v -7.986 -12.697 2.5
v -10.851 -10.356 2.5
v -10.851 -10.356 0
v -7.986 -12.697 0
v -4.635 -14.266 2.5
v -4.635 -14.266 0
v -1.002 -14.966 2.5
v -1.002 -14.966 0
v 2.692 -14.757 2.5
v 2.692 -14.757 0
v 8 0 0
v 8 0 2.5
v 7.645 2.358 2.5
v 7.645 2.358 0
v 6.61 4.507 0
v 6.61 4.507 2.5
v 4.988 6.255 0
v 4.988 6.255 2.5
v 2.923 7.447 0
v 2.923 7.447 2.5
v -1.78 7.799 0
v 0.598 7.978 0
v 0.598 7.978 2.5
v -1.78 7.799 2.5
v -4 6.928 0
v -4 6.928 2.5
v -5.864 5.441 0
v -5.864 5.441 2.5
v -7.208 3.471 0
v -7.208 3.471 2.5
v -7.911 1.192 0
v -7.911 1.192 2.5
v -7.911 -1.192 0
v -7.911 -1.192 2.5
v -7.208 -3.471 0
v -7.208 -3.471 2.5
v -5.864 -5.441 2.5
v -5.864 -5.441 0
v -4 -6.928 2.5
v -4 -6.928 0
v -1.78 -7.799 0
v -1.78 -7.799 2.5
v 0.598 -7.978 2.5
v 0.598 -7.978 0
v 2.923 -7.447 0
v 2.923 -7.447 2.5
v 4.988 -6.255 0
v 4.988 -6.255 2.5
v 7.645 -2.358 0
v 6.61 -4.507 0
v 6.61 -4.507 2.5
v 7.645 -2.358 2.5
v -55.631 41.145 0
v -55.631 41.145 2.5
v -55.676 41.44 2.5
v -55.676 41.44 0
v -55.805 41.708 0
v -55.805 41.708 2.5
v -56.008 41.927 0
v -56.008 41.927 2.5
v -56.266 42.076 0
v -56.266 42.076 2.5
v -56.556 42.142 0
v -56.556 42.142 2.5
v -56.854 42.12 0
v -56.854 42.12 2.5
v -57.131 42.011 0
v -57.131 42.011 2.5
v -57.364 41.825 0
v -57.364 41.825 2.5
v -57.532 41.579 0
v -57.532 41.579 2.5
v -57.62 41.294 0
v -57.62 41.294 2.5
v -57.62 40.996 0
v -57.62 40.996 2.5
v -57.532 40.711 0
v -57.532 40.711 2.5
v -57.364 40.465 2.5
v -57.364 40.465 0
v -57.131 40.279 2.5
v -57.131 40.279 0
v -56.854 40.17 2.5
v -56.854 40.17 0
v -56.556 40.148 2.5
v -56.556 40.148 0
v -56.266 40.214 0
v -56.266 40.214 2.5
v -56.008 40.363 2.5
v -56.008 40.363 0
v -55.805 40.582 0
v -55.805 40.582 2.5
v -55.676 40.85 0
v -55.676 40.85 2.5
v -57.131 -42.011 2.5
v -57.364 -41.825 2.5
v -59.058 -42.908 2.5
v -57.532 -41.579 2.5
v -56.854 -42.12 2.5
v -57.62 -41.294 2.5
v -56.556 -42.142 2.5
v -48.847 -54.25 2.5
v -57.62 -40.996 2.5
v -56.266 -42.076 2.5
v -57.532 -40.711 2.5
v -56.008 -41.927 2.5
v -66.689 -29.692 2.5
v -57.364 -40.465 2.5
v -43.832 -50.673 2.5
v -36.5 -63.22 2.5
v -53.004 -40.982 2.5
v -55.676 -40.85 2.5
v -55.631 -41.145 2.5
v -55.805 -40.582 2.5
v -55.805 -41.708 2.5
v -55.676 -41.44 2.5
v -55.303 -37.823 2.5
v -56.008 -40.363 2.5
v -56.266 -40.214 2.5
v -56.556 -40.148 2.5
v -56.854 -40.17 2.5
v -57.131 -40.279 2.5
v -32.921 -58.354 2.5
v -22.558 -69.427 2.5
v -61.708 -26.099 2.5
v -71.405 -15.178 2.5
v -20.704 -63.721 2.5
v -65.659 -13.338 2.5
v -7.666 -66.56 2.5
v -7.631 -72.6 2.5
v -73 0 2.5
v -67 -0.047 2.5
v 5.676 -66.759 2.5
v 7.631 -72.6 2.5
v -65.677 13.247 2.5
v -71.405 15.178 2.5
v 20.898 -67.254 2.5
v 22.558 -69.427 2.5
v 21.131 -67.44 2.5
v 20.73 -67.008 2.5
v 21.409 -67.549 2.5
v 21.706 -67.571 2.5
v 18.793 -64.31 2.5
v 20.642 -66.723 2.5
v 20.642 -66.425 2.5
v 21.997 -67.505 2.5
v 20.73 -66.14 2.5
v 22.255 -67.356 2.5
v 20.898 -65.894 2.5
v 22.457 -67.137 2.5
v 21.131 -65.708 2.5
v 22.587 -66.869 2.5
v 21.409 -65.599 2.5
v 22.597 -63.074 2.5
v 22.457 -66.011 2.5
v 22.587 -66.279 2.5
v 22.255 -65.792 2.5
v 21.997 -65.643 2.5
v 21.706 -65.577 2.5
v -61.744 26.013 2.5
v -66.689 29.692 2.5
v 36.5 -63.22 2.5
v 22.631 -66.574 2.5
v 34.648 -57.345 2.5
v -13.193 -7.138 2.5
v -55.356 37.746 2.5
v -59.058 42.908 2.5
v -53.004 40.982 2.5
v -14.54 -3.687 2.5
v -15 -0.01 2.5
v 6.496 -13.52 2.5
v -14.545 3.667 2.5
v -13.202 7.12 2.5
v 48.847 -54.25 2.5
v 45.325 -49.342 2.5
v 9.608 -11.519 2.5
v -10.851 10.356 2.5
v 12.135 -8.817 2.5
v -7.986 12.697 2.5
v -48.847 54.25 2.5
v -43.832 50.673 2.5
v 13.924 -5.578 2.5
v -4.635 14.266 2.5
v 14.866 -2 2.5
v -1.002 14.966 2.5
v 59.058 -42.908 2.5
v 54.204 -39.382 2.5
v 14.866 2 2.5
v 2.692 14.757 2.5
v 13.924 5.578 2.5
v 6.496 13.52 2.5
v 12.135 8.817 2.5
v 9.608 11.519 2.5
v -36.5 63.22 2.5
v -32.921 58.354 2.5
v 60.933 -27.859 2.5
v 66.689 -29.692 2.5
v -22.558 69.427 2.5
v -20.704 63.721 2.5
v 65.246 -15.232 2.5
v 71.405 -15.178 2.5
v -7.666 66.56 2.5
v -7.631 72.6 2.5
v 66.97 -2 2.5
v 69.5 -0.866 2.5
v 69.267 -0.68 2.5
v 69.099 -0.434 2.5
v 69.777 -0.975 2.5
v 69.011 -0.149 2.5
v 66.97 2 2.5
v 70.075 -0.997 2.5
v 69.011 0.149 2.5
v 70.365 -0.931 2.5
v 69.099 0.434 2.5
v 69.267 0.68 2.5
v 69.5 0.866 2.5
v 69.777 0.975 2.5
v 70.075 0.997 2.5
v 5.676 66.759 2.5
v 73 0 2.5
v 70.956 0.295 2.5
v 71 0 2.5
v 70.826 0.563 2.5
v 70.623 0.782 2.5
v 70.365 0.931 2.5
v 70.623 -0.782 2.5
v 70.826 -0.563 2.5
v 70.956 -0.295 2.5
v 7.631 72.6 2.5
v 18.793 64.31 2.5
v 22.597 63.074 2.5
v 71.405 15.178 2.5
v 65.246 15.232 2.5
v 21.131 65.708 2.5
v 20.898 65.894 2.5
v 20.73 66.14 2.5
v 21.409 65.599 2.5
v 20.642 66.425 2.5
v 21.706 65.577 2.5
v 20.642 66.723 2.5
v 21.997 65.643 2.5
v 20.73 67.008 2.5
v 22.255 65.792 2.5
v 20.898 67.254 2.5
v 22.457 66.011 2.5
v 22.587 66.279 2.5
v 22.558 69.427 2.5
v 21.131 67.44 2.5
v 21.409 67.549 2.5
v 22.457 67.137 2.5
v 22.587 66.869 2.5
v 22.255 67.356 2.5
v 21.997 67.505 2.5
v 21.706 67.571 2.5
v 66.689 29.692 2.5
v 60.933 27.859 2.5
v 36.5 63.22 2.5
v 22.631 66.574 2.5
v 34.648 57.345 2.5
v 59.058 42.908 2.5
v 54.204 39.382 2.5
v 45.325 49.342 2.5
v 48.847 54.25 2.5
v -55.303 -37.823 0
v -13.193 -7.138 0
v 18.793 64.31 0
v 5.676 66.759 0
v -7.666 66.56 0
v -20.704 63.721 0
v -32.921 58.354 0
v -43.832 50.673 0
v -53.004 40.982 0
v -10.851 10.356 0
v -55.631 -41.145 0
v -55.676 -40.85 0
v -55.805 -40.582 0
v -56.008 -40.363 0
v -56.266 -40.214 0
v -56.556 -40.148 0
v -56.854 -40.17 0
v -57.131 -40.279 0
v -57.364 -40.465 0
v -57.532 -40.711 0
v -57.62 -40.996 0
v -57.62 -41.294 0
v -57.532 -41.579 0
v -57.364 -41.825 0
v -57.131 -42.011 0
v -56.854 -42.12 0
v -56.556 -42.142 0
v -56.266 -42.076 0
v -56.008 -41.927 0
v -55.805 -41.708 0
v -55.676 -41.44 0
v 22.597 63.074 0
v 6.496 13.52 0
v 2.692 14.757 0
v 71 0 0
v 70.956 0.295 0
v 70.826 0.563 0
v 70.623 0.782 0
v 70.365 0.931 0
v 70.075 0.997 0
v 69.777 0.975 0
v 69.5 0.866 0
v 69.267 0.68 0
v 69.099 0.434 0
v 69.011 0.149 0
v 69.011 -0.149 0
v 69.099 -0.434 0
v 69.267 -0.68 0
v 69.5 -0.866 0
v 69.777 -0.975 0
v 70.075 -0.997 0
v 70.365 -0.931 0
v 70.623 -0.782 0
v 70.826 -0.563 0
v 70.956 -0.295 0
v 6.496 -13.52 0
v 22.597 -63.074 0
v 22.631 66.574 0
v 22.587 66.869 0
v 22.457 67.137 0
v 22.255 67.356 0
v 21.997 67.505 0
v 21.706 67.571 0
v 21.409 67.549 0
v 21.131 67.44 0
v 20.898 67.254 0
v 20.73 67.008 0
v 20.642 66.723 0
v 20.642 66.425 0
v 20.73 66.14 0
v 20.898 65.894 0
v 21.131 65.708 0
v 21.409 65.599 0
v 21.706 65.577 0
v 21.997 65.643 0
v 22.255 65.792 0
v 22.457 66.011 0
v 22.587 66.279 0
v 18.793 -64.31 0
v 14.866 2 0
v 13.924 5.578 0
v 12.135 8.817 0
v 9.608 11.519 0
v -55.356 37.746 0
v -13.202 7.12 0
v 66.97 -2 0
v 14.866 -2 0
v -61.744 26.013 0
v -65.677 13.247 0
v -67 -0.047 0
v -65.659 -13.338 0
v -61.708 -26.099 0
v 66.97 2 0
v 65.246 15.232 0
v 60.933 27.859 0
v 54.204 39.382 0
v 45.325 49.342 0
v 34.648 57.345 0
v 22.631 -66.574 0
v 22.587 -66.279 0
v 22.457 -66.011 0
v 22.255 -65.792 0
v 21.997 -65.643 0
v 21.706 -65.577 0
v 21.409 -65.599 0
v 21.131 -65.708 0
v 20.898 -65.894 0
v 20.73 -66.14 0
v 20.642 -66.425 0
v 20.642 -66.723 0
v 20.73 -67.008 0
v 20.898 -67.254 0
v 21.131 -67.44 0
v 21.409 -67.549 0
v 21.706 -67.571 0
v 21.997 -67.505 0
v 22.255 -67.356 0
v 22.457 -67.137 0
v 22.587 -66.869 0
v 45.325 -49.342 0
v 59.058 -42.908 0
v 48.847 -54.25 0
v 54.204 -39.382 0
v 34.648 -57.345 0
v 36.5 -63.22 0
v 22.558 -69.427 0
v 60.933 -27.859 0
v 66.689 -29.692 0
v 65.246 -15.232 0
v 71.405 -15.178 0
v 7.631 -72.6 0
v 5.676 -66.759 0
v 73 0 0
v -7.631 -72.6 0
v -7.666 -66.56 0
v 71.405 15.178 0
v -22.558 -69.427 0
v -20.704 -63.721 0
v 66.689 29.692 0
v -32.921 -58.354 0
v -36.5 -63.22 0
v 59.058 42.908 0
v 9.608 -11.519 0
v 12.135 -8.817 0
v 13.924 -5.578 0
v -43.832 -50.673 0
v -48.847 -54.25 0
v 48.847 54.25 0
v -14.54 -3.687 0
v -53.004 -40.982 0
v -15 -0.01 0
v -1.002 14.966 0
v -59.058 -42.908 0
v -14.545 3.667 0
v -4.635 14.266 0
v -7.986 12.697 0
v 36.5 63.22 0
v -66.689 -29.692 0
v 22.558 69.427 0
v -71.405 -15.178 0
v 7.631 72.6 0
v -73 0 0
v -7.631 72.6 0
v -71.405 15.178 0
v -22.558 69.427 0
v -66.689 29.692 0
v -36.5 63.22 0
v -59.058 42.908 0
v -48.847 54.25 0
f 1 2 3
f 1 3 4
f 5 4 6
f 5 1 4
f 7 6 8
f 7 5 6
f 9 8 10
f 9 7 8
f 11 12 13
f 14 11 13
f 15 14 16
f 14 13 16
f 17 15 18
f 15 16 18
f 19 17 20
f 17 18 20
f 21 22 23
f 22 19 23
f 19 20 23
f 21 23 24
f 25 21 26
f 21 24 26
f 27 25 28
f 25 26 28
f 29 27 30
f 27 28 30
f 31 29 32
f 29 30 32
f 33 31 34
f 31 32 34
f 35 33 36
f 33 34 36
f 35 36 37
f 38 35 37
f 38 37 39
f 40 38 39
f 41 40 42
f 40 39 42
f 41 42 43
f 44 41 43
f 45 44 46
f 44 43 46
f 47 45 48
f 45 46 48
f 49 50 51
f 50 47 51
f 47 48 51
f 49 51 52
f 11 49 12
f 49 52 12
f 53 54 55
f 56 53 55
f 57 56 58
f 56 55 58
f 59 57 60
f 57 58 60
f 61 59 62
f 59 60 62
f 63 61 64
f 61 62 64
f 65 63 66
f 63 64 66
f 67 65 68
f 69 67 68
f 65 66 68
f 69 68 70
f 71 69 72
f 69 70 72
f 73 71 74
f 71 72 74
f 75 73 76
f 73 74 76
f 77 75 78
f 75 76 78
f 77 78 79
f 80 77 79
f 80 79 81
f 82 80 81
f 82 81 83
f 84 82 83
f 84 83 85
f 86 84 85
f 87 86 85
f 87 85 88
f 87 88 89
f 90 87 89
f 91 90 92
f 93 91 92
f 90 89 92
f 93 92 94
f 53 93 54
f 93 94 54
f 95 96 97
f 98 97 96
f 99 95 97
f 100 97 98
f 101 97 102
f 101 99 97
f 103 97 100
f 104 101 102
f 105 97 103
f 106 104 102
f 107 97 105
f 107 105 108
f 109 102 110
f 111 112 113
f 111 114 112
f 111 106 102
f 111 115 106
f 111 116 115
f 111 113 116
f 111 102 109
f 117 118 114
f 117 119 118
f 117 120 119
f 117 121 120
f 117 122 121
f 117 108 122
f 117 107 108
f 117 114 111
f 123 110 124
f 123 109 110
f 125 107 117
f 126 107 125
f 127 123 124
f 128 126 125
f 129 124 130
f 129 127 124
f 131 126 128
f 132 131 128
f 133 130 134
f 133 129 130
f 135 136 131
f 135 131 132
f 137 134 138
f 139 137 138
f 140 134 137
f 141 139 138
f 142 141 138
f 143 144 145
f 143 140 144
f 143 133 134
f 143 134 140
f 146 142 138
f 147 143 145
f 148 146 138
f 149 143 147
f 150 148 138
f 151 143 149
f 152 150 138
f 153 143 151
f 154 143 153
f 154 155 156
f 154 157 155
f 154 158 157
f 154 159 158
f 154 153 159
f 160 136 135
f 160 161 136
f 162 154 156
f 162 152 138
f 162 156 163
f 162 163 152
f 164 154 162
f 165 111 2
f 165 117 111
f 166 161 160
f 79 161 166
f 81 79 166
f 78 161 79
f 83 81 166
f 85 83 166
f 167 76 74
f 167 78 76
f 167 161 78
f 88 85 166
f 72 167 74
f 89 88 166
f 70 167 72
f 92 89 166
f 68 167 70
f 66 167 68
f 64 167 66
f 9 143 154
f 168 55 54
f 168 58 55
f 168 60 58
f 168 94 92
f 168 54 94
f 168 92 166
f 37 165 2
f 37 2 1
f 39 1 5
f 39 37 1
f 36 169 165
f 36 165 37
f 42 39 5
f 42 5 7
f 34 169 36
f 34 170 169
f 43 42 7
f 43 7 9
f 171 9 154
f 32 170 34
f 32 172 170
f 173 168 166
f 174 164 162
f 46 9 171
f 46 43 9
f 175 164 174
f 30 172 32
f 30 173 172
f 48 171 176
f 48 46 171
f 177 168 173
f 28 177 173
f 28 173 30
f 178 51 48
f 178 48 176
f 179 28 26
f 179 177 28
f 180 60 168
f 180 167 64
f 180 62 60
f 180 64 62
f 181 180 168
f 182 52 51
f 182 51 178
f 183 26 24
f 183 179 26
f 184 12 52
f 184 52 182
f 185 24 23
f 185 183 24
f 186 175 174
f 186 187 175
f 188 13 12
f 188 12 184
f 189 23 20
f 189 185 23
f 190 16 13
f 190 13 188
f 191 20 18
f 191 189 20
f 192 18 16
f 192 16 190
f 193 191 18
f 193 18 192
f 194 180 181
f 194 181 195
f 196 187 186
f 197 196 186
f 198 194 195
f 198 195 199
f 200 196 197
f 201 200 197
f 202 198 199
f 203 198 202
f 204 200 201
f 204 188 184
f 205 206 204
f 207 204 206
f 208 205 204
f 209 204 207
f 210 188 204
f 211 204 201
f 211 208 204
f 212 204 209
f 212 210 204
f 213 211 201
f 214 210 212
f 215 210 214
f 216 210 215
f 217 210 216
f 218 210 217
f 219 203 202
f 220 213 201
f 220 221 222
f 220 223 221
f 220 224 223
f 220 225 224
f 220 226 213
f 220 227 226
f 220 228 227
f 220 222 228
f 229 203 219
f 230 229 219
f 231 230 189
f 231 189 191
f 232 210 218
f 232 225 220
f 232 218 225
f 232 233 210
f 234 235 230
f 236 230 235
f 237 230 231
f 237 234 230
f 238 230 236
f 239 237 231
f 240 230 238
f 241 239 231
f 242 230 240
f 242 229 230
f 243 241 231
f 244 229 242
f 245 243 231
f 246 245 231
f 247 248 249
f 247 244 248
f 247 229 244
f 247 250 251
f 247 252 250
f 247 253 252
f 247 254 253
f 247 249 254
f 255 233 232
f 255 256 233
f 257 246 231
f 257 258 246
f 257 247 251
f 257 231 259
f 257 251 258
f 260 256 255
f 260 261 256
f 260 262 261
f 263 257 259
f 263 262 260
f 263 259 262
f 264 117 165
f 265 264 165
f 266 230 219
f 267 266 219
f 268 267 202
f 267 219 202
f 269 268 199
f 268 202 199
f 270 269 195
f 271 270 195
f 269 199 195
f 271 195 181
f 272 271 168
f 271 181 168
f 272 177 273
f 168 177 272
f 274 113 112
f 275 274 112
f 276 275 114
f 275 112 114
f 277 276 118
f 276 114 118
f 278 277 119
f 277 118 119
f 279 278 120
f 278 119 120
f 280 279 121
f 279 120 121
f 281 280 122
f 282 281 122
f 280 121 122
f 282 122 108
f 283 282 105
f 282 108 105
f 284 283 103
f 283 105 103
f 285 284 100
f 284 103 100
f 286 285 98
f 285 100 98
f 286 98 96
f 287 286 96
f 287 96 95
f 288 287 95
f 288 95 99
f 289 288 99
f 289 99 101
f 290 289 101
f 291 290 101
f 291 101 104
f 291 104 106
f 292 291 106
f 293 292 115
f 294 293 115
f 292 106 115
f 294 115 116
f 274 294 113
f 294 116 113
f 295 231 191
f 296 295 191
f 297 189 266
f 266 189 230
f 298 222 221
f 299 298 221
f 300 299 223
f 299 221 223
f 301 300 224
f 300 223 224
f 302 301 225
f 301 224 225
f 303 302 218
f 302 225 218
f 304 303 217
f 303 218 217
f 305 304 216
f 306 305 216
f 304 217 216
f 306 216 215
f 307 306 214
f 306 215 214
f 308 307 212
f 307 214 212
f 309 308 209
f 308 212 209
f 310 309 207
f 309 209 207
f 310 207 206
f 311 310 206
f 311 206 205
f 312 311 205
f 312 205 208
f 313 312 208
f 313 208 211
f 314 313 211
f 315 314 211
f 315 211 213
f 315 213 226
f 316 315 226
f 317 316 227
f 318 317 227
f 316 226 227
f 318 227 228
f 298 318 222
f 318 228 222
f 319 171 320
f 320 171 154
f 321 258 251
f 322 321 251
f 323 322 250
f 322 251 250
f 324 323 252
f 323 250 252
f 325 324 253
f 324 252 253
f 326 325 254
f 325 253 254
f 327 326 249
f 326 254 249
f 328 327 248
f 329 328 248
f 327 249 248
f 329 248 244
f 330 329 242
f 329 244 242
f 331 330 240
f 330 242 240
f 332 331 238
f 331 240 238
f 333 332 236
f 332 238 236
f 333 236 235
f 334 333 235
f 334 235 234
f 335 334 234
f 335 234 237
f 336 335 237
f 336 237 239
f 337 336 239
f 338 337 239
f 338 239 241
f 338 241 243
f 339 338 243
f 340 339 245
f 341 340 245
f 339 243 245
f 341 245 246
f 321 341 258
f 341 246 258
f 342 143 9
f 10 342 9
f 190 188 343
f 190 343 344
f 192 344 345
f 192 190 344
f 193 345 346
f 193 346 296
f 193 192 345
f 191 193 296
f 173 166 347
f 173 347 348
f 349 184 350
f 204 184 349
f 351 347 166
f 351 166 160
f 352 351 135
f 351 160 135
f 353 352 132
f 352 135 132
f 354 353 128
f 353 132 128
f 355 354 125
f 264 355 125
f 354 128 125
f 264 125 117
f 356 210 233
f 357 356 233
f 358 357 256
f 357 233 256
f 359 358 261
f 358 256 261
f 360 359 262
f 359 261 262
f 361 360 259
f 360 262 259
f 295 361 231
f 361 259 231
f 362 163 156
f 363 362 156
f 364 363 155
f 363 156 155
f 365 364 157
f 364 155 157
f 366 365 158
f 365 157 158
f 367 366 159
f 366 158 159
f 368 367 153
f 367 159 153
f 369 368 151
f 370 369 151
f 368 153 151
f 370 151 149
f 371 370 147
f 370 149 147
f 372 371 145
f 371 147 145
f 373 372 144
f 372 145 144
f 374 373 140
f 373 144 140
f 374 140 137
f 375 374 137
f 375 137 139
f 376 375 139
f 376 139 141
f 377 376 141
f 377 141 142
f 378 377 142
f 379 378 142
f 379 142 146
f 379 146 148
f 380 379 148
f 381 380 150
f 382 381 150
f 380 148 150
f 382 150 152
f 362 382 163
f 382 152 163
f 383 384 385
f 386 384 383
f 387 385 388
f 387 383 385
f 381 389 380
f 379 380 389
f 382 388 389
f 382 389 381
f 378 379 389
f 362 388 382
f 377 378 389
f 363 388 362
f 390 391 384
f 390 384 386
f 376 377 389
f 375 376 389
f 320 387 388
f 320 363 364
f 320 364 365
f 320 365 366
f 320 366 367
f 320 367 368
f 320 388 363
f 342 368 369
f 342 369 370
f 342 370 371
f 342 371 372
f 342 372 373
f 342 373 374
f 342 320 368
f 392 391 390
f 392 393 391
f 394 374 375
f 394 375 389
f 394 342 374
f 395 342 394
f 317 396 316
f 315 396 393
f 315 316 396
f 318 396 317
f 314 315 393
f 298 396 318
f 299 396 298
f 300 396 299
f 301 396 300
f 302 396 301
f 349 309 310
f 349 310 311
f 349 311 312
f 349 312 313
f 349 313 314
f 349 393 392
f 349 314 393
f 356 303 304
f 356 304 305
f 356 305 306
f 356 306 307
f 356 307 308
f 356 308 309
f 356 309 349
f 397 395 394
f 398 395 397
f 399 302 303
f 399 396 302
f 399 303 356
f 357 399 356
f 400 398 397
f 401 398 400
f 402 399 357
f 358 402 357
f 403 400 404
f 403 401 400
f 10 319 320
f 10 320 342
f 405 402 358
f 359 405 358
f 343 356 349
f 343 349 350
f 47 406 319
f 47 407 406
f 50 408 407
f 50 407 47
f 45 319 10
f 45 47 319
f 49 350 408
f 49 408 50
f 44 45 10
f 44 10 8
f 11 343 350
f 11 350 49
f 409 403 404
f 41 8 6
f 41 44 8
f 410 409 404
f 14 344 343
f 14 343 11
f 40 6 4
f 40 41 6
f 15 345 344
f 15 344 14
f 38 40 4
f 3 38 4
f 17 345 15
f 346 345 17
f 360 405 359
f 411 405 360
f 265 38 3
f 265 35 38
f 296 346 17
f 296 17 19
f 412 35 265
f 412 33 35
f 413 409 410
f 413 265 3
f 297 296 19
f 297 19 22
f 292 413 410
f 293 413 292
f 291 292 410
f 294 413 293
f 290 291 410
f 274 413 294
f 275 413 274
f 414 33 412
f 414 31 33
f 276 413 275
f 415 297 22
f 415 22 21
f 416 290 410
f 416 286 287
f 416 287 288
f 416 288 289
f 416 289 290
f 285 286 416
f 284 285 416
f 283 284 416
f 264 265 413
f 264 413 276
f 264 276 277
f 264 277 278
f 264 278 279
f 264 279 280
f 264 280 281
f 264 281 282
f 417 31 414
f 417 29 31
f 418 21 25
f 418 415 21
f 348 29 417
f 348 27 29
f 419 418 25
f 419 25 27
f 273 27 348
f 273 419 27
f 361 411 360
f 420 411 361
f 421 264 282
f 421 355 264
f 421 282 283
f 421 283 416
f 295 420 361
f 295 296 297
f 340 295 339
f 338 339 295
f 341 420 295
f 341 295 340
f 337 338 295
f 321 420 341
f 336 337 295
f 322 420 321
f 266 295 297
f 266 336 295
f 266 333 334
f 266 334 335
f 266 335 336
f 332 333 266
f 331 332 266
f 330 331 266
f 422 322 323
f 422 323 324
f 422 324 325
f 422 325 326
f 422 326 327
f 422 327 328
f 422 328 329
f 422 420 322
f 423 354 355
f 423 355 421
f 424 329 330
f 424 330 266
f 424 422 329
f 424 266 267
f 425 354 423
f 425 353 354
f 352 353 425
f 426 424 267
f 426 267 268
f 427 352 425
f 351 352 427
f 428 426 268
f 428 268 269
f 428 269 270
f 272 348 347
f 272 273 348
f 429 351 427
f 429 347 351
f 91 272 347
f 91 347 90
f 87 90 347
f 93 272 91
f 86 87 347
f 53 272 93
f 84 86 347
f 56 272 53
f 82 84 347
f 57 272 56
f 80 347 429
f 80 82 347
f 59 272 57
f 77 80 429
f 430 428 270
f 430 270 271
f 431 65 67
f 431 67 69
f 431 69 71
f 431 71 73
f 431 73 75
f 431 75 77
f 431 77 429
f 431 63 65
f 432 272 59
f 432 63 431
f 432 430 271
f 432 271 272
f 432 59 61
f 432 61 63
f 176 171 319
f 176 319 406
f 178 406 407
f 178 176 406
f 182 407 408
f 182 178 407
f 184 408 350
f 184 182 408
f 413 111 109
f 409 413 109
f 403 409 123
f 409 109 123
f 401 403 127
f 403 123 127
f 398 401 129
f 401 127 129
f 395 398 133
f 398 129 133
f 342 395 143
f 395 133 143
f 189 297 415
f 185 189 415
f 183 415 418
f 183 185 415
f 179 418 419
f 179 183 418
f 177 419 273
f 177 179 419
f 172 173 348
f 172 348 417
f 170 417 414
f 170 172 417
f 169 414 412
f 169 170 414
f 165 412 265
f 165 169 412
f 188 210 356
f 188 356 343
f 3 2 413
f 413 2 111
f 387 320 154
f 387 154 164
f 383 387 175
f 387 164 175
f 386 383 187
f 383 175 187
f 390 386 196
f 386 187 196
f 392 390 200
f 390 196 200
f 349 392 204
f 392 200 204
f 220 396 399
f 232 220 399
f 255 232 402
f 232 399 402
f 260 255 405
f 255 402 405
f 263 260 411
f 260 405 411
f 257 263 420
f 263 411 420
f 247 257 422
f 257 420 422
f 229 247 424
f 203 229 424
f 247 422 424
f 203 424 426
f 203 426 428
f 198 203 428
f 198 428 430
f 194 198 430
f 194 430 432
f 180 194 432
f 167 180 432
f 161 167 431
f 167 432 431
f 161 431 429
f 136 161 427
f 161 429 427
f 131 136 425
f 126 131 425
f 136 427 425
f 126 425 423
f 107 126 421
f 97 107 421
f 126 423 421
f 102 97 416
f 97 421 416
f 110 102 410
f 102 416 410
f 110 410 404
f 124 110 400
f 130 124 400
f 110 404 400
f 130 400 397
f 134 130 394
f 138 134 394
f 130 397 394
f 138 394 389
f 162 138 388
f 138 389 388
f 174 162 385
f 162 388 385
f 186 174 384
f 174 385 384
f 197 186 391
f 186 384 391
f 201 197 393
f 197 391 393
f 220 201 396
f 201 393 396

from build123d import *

# Parameters (mm, degrees)
SKETCH_3_R          = 73
EXTRUDE_3_DEPTH     = 2.5
SKETCH_5_R          = 67
CUT_EXTRUDE_1_DEPTH = 2.5
SKETCH_6_R          = 15
EXTRUDE_4_DEPTH     = 2.5
SKETCH_7_R          = 8
CUT_EXTRUDE_2_DEPTH = 2.5
EXTRUDE_6_DEPTH     = 2.5
EXTRUDE_7_DEPTH     = 2.5
EXTRUDE_8_DEPTH     = 2.5
EXTRUDE_9_DEPTH     = 2.5
EXTRUDE_10_DEPTH    = 2.5
SKETCH_14_R         = 8
CUT_EXTRUDE_3_DEPTH = 2.5
SKETCH_15_R         = 1
CUT_EXTRUDE_4_DEPTH = 2.5


with BuildPart() as part:
    # 草图3 → 凸台-拉伸3 (new body)
    with BuildSketch(Plane.XY):
        Circle(SKETCH_3_R)
    extrude(amount=EXTRUDE_3_DEPTH)

    # 草图5 → 切除-拉伸1 (cut)
    with BuildSketch(Plane.XY.offset(2.5)):
        Circle(SKETCH_5_R)
    extrude(amount=-CUT_EXTRUDE_1_DEPTH, mode=Mode.SUBTRACT)



with BuildPart() as body_2:
    # 草图6 → 凸台-拉伸4 (new body)
    with BuildSketch(Plane.XY.offset(2.5)):
        Circle(SKETCH_6_R)
    extrude(amount=-EXTRUDE_4_DEPTH)

    # 草图7 → 切除-拉伸2 (cut)
    with BuildSketch(Plane.XY.offset(2.5)):
        Circle(SKETCH_7_R)
    extrude(amount=-CUT_EXTRUDE_2_DEPTH, mode=Mode.SUBTRACT)


with BuildPart() as part_1:
    add(part.part)

    add(body_2.part)  # 凸台-拉伸6 merges body 2
    # 草图9 → 凸台-拉伸6 (add)
    with BuildSketch(Plane.XY.offset(2.5)):
        with BuildLine():
            Line((0, 2), (0, 0))
            Line((0, 0), (0, -2))
            Line((0, -2), (66.970142601, -2))
            ThreePointArc((66.970142601, -2), (67, 0), (66.970142601, 2))
            Line((66.970142601, 2), (0, 2))
        make_face()
    extrude(amount=-EXTRUDE_6_DEPTH)

    # 草图10 → 凸台-拉伸7 (add)
    with BuildSketch(Plane.XY.offset(2.5)):
        with BuildLine():
            Line((1.902113033, -0.618033989), (0, 0))
            Line((0, 0), (-1.902113033, 0.618033989))
            Line((-1.902113033, 0.618033989), (18.792799147, 64.310424507))
            ThreePointArc((18.792799147, 64.310424507), (20.704138623, 63.720786592), (22.597025212, 63.074356529))
            Line((22.597025212, 63.074356529), (1.902113033, -0.618033989))
        make_face()
    extrude(amount=-EXTRUDE_7_DEPTH)

    # 草图11 → 凸台-拉伸8 (add)
    with BuildSketch(Plane.XY.offset(2.5)):
        with BuildLine():
            Line((0, 0), (1.175570505, 1.618033989))
            Line((1.175570505, 1.618033989), (-53.004412975, 40.982096154))
            ThreePointArc((-53.004412975, 40.982096154), (-54.204138623, 39.381611904), (-55.355553985, 37.746028176))
            Line((-55.355553985, 37.746028176), (-1.175570505, -1.618033989))
            Line((-1.175570505, -1.618033989), (0, 0))
        make_face()
    extrude(amount=-EXTRUDE_8_DEPTH)

    # 草图12 → 凸台-拉伸9 (add)
    with BuildSketch(Plane.XY.offset(2.5)):
        with BuildLine():
            Line((0, 0), (1.175570505, -1.618033989))
            Line((1.175570505, -1.618033989), (-53.004412975, -40.982096154))
            ThreePointArc((-53.004412975, -40.982096154), (-54.176759621, -39.419268347), (-55.30304181, -37.822923823))
            Line((-55.30304181, -37.822923823), (-1.175570505, 1.618033989))
            Line((-1.175570505, 1.618033989), (0, 0))
        make_face()
    extrude(amount=-EXTRUDE_9_DEPTH)

    # 草图13 → 凸台-拉伸10 (add)
    with BuildSketch(Plane.XY.offset(2.5)):
        with BuildLine():
            Line((0, 0), (1.902113033, 0.618033989))
            Line((1.902113033, 0.618033989), (22.597025212, -63.074356529))
            ThreePointArc((22.597025212, -63.074356529), (20.704138623, -63.720786592), (18.792799147, -64.310424507))
            Line((18.792799147, -64.310424507), (-1.902113033, -0.618033989))
            Line((-1.902113033, -0.618033989), (0, 0))
        make_face()
    extrude(amount=-EXTRUDE_10_DEPTH)

    # 草图14 → 切除-拉伸3 (cut)
    with BuildSketch(Plane.XY.offset(2.5)):
        Circle(SKETCH_14_R)
    extrude(amount=-CUT_EXTRUDE_3_DEPTH, mode=Mode.SUBTRACT)

    # 草图15 → 切除-拉伸4 (cut)
    with BuildSketch(Plane.XY.offset(2.5)):
        with Locations((70, 0)):
            Circle(SKETCH_15_R)
        with Locations((21.631189606, 66.573956141)):
            Circle(SKETCH_15_R)
        with Locations((-56.631189606, 41.14496766)):
            Circle(SKETCH_15_R)
        with Locations((-56.631189606, -41.14496766)):
            Circle(SKETCH_15_R)
        with Locations((21.631189606, -66.573956141)):
            Circle(SKETCH_15_R)
    extrude(amount=-CUT_EXTRUDE_4_DEPTH, mode=Mode.SUBTRACT)


solid = part_1.part
